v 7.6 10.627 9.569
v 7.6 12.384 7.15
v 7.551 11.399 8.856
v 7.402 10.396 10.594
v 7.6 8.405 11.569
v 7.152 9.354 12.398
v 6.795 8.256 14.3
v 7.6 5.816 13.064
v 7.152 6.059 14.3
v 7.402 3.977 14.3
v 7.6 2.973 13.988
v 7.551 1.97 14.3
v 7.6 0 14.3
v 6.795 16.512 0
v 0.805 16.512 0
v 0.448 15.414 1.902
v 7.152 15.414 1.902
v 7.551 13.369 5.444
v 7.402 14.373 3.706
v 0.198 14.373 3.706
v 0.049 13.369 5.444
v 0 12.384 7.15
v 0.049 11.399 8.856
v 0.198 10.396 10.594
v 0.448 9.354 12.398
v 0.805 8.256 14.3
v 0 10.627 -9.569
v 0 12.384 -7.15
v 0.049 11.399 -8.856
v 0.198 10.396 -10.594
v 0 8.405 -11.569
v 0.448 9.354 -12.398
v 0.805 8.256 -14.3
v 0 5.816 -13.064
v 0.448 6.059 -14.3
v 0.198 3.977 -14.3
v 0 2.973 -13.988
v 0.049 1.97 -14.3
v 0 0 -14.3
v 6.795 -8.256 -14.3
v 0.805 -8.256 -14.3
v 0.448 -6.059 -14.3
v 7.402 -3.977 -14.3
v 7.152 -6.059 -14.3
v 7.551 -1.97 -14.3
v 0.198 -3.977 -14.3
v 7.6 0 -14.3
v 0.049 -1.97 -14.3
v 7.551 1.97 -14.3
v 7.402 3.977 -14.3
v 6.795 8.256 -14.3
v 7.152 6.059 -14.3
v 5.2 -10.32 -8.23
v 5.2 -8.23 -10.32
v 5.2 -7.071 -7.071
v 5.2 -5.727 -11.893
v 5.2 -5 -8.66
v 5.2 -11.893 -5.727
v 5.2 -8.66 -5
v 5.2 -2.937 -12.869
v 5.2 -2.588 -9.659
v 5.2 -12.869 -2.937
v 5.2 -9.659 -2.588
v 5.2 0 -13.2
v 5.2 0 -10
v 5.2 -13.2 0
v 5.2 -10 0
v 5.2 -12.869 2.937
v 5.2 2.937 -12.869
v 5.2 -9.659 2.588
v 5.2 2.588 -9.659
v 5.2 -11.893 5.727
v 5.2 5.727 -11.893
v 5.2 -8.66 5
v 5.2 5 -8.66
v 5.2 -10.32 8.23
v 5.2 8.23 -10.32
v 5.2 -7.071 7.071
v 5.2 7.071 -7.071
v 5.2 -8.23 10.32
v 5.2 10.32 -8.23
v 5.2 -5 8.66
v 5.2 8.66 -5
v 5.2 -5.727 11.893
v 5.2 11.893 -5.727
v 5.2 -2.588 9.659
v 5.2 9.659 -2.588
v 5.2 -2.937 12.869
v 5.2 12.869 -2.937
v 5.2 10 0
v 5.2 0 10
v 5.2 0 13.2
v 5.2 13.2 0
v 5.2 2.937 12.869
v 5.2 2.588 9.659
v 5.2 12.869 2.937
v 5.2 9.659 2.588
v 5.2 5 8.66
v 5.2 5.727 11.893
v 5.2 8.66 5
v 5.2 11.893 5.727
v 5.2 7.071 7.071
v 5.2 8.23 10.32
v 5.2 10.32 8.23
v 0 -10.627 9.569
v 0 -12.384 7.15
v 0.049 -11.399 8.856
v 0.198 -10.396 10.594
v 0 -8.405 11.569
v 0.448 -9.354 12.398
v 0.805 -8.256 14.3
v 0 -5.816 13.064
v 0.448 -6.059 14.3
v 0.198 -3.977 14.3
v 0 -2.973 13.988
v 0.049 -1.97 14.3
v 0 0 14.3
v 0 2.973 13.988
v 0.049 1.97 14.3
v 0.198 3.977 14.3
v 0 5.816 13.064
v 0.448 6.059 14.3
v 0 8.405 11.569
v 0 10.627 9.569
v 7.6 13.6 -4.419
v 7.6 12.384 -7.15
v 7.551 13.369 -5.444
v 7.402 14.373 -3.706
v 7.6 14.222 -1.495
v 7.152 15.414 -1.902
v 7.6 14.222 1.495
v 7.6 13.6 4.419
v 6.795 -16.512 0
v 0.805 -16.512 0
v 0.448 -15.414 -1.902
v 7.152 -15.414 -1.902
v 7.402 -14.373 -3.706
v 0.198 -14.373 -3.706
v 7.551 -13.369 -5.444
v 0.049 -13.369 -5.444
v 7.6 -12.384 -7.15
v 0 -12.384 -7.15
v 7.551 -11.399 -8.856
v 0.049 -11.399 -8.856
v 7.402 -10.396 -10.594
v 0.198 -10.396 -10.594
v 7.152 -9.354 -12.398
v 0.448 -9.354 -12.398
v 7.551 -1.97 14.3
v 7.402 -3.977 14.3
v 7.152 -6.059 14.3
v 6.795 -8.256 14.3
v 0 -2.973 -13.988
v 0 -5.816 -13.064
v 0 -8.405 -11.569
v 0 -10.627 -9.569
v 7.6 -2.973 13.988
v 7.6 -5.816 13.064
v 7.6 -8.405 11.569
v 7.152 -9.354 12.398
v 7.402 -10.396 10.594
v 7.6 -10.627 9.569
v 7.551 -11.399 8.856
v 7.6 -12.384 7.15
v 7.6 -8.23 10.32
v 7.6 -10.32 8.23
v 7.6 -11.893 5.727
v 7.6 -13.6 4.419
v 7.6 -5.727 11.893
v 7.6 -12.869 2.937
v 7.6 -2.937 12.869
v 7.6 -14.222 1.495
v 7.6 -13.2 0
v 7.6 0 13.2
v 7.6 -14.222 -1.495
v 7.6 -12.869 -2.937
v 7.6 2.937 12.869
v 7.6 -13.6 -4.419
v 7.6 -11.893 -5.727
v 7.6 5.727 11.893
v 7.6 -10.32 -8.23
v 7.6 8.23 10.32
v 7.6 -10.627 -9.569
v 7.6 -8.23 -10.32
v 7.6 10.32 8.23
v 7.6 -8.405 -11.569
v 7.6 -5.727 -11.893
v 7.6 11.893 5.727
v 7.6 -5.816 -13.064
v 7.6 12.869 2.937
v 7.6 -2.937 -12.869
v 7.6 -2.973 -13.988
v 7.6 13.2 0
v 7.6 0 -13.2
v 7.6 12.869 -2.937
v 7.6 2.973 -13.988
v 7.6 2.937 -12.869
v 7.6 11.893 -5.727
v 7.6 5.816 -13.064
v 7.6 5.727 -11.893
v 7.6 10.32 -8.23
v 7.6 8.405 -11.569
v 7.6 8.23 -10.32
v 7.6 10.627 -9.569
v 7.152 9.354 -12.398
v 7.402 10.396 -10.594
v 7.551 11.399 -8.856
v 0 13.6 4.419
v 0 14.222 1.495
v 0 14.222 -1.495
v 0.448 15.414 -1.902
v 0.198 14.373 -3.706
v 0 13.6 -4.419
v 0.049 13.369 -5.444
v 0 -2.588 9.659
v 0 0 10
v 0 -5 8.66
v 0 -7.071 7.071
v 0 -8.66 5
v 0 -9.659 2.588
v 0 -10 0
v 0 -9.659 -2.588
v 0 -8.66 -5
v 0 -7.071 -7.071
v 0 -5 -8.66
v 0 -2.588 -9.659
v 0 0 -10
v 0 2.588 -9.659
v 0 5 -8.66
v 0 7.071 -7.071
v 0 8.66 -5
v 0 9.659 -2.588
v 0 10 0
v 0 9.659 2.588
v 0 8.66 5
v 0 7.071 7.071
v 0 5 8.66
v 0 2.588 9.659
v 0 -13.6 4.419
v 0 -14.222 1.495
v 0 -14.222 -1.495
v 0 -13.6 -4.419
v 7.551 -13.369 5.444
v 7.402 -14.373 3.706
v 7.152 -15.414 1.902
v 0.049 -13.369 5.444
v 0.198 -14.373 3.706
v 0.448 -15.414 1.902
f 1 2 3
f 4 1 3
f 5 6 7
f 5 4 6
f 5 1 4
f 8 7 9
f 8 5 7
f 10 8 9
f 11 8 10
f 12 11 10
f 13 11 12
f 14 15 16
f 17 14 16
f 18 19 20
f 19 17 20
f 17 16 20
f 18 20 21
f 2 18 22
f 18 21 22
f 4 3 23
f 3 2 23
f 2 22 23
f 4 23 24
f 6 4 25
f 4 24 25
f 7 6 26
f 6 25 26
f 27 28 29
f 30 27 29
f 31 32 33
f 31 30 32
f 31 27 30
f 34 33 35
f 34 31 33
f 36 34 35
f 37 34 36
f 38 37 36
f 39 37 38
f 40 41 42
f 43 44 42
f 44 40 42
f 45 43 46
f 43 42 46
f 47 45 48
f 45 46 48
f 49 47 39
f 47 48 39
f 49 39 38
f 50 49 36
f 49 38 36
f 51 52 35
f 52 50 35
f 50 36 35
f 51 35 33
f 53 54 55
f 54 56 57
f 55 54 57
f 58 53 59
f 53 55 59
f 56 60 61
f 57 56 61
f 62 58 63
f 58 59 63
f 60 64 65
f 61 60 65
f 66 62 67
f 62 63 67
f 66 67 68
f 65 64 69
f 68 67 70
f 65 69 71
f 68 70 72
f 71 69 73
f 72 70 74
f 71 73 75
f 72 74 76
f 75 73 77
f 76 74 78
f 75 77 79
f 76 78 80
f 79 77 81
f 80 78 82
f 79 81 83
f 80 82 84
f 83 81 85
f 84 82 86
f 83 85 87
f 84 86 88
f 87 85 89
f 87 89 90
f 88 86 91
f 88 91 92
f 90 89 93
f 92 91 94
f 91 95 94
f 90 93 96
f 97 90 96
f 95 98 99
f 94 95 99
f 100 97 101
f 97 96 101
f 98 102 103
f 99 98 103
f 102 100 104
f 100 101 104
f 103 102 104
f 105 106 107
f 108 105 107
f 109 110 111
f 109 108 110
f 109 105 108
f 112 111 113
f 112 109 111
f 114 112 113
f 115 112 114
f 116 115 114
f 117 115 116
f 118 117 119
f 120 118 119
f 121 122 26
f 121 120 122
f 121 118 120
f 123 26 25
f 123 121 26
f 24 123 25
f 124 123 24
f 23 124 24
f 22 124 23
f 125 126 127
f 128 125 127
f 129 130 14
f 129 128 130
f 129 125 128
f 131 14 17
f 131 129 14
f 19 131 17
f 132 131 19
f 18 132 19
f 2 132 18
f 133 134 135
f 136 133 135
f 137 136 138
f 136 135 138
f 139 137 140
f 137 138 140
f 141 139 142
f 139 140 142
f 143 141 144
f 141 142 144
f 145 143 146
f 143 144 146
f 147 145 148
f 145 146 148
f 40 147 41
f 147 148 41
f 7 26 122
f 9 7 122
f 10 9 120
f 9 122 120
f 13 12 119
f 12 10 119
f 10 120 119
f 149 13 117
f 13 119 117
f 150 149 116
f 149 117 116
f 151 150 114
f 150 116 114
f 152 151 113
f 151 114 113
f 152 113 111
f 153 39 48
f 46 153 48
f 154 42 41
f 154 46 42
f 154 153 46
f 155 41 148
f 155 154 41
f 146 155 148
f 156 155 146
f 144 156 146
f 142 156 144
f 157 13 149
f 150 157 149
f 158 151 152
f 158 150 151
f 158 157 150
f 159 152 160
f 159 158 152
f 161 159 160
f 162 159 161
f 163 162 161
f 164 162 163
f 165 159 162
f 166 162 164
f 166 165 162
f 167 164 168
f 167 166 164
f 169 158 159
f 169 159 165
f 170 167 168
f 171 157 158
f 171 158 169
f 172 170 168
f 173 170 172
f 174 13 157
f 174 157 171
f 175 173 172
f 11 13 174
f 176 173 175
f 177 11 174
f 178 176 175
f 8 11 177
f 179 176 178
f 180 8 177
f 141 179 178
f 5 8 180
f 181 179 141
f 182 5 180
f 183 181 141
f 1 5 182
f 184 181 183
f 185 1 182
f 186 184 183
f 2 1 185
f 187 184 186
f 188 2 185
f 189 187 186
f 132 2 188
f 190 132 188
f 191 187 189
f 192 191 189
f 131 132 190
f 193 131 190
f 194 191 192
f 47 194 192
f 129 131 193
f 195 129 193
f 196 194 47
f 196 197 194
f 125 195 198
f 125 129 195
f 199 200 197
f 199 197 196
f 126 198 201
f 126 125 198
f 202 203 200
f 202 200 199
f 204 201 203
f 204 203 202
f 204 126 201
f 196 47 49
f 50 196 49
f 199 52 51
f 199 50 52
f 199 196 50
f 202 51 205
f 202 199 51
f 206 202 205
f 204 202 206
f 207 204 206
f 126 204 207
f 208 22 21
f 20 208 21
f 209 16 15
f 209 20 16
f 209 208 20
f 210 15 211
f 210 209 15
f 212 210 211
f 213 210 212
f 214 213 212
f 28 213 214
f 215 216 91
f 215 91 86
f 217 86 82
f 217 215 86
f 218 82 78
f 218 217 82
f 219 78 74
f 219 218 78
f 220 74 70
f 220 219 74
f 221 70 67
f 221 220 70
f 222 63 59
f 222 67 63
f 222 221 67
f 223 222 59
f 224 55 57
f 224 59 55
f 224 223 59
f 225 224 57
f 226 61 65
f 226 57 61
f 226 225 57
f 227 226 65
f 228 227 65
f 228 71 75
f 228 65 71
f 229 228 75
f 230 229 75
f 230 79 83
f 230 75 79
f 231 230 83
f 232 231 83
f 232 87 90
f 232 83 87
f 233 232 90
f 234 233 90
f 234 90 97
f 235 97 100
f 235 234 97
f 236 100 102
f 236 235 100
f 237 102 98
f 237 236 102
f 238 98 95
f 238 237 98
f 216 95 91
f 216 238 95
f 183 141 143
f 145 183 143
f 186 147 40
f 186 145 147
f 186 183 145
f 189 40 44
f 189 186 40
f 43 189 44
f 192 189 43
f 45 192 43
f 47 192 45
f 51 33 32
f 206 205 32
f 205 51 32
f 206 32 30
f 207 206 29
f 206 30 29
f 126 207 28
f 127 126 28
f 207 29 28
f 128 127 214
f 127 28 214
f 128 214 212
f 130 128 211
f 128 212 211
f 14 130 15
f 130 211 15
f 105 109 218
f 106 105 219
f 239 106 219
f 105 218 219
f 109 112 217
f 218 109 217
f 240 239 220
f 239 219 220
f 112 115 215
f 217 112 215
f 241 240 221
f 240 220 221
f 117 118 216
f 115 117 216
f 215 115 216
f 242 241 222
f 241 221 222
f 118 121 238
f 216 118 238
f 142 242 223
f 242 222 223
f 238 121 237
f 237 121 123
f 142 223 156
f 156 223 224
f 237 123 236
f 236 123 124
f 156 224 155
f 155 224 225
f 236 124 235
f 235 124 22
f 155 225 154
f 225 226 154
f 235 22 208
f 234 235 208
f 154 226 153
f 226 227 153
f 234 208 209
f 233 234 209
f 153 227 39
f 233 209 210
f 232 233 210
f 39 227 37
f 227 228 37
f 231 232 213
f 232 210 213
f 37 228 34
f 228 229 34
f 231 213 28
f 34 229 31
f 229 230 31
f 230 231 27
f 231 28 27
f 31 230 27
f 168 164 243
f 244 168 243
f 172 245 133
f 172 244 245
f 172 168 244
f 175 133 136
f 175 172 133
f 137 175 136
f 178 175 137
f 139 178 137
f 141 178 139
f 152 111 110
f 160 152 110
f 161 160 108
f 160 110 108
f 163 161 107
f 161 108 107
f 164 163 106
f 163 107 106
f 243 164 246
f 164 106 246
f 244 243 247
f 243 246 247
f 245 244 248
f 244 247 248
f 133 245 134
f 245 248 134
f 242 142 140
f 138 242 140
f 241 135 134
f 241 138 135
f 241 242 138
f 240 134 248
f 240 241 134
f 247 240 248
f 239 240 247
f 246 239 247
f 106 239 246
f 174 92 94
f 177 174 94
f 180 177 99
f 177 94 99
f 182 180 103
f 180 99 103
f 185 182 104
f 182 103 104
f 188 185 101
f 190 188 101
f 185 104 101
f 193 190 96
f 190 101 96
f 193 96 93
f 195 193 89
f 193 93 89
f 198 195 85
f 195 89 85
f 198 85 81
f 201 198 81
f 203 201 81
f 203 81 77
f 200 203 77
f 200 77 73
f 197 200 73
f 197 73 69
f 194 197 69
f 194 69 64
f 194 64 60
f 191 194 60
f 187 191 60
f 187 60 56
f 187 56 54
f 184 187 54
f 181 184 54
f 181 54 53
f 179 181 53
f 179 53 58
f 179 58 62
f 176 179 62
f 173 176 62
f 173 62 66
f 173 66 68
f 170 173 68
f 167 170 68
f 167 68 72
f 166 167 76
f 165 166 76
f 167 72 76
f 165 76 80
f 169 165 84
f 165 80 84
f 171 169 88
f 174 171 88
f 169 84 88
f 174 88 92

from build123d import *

# Parameters (mm, degrees)
ESBO_O1_R                = 10
RESSALTO_EXTRUS_O1_DEPTH = 7.6
FURO1_D                  = 26.4
FURO1_DEPTH              = 2.4
ESBO_O7_OUTSIDE_W        = 110.904
ESBO_O7_OUTSIDE_H        = 115.328
ESBO_O7_OUTSIDE_R        = 14.3
CORTE_EXTRUS_O1_DEPTH    = 13
CORTE_EXTRUS_O1_DRAFT    = -70
ESBO_O8_OUTSIDE_W        = 110.904
ESBO_O8_OUTSIDE_H        = 115.328
ESBO_O8_OUTSIDE_R        = 14.3
CORTE_EXTRUS_O2_DEPTH    = 13
CORTE_EXTRUS_O2_DRAFT    = -70


with BuildPart() as part:
    # Esboço1 → Ressalto-extrusão1 (new body)
    with BuildSketch(Plane(origin=(0, 0, 0), x_dir=(0, 0, -1), z_dir=(1, 0, 0))):
        Polygon((14.3, 8.256108849), (0, 16.512217699), (-14.3, 8.256108849), (-14.3, -8.256108849), (0, -16.512217699), (14.3, -8.256108849), align=None)
        with Locations(Location((0, 0, 0), (0, 0, 180))):
            Circle(ESBO_O1_R, mode=Mode.SUBTRACT)
    extrude(amount=RESSALTO_EXTRUS_O1_DEPTH)

    # Furo1
    with Locations(Plane(origin=(7.6, 0, 0), x_dir=(0, 0, -1), z_dir=(1, 0, 0))):
        with Locations((0, 0)):
            Hole(FURO1_D / 2, depth=FURO1_DEPTH)


with BuildPart() as corte_extrus_o1_tool:
    # Esboço7 outside → Corte-extrusão1 (with draft: the straight prism first)
    with BuildSketch(Plane(origin=(7.6, 0, 0), x_dir=(0, 0, -1), z_dir=(1, 0, 0))):
        Rectangle(ESBO_O7_OUTSIDE_W, ESBO_O7_OUTSIDE_H)
        Circle(ESBO_O7_OUTSIDE_R, mode=Mode.SUBTRACT)
    extrude(amount=-CORTE_EXTRUS_O1_DEPTH)
    # Corte-extrusão1: the draft: its side faces are tilted about the plane it starts from
    corte_extrus_o1_sides = [corte_extrus_o1_tool.faces().sort_by_distance(p)[0] for p in [
        (1.1, -57.664, 0),
        (1.1, 0, -55.452),
        (1.1, 57.664, 0),
        (1.1, 0, 55.452),
        (1.1, 0, 14.3),
    ]]
    draft(corte_extrus_o1_sides, Plane(origin=(7.6, 0, 0), x_dir=(0, 0, -1), z_dir=(1, 0, 0)), CORTE_EXTRUS_O1_DRAFT)


with BuildPart() as part_1:
    add(part.part)

    # Corte-extrusão1: cut by corte_extrus_o1_tool
    add(corte_extrus_o1_tool.part, mode=Mode.SUBTRACT)


with BuildPart() as corte_extrus_o2_tool:
    # Esboço8 outside → Corte-extrusão2 (with draft: the straight prism first)
    with BuildSketch(Plane.ZY):
        Rectangle(ESBO_O8_OUTSIDE_W, ESBO_O8_OUTSIDE_H)
        Circle(ESBO_O8_OUTSIDE_R, mode=Mode.SUBTRACT)
    extrude(amount=-CORTE_EXTRUS_O2_DEPTH)
    # Corte-extrusão2: the draft: its side faces are tilted about the plane it starts from
    corte_extrus_o2_sides = [corte_extrus_o2_tool.faces().sort_by_distance(p)[0] for p in [
        (6.5, -57.664, 0),
        (6.5, 0, 55.452),
        (6.5, 57.664, 0),
        (6.5, 0, -55.452),
        (6.5, 0, -14.3),
    ]]
    draft(corte_extrus_o2_sides, Plane.ZY, CORTE_EXTRUS_O2_DRAFT)


with BuildPart() as part_2:
    add(part_1.part)

    # Corte-extrusão2: cut by corte_extrus_o2_tool
    add(corte_extrus_o2_tool.part, mode=Mode.SUBTRACT)


solid = part_2.part
